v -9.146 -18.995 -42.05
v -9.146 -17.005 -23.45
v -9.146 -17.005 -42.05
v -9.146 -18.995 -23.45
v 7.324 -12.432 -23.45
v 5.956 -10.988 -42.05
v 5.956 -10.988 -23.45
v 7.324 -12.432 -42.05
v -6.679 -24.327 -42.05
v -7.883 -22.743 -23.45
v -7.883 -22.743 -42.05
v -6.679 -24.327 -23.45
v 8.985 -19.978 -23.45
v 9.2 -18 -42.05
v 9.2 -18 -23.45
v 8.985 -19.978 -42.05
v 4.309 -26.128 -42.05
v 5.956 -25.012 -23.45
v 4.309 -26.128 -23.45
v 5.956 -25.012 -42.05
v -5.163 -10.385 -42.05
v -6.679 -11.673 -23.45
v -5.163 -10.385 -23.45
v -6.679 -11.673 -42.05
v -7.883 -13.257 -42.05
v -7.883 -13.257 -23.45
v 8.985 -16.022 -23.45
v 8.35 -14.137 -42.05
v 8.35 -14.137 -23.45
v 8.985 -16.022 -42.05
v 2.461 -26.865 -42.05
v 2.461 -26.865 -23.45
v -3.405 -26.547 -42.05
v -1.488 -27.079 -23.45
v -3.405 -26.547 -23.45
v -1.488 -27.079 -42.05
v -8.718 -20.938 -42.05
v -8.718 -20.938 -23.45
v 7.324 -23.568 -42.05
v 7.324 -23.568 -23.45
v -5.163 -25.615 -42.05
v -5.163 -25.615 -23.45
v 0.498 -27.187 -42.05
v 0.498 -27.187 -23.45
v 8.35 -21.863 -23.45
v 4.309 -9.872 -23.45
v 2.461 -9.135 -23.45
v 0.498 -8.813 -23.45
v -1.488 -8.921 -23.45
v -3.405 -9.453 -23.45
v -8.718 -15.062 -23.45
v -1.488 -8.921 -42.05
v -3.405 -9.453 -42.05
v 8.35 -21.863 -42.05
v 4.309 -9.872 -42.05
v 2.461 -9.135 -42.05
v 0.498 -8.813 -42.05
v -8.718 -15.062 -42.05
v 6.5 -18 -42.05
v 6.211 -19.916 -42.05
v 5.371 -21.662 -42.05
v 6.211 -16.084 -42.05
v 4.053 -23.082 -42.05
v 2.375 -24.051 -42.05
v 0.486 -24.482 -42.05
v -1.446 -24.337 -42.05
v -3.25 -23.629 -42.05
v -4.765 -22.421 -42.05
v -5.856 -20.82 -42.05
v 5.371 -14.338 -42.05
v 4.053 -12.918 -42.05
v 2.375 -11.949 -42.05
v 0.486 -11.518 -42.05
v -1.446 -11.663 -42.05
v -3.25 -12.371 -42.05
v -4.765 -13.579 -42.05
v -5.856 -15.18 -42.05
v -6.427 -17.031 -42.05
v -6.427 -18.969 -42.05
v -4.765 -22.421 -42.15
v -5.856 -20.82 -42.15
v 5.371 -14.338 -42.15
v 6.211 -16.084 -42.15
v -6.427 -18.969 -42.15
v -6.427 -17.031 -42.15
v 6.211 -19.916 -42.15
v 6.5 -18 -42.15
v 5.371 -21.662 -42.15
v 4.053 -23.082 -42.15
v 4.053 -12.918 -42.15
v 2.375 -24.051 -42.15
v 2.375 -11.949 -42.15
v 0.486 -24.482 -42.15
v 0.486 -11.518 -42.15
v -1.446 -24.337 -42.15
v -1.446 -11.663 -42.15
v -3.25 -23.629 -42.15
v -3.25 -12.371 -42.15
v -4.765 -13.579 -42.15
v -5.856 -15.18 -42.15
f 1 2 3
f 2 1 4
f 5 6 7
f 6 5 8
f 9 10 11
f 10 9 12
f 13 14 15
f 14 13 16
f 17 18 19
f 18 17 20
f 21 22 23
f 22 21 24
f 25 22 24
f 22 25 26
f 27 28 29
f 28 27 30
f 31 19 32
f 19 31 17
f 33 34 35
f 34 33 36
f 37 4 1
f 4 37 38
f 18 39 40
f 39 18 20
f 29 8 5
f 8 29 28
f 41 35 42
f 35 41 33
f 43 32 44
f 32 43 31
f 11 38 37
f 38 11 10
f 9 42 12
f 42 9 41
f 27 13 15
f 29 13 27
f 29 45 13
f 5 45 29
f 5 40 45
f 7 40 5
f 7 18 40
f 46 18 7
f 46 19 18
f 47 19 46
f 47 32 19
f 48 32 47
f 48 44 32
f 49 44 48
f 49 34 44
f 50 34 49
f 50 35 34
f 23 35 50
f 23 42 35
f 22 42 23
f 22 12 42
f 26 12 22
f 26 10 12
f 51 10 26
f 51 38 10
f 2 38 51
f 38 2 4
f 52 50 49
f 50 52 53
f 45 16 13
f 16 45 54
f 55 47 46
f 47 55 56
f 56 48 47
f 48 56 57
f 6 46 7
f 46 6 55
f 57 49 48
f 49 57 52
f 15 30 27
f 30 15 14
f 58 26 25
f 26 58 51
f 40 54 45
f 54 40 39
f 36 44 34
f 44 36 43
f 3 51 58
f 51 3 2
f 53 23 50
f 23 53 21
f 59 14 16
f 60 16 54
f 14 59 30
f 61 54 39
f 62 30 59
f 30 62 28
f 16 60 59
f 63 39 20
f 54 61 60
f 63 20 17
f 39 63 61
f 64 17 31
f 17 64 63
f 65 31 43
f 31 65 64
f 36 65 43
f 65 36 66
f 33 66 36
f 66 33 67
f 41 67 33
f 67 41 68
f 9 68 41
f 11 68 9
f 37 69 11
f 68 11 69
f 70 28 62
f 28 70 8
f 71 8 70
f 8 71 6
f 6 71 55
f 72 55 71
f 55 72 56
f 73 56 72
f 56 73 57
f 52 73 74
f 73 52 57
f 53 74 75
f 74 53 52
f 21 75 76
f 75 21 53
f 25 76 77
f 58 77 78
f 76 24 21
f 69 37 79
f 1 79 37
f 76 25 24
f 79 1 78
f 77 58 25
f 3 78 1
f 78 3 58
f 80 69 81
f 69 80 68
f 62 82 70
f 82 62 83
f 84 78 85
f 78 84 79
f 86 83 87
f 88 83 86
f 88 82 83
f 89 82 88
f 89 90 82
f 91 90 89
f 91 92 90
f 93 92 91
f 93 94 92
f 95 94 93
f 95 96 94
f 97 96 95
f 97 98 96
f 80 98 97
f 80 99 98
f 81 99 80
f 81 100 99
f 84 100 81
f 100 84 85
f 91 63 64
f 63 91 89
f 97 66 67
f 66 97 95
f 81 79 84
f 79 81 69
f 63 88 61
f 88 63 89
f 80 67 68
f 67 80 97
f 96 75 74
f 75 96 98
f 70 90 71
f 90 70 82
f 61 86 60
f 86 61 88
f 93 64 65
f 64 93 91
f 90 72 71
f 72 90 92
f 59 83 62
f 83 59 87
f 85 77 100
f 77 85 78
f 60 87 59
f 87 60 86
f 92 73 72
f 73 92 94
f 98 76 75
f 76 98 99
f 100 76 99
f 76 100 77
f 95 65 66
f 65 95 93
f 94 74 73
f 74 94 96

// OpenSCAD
// file: common.scad
module basicShape(height)
translate ([0, 0, ground]) union(){
    difference(){
	   	union(){
	        intersection(){
	            rotate ([0, 0, 30]) 
                    cylinder_outer(height, (outerDiameter*0.5+minWallThickness), 6);
	            translate ([0,0,(height/2)]) 
                    cube ([outerDiameter*2, (sqrt(3)*(outerDiameter*0.5+minWallThickness)), height], center = true);
	 	    };
	        cylinder(height, d=(outerDiameter + 2* minWallThickness)); 
	   	};
        union(){
        	translate ([0, 0, floorThickness]) 
                cylinder(height, d=innerDiameter, center=false);
        	translate ([0, 0, (height - pipeInsert)]) 
                cylinder(height, d=outerDiameter, center=false);
        };
    };
};


module cylinder_outer(height,radius,fn){  	//from https://en.wikibooks.org/wiki/OpenSCAD_User_Manual/undersized_circular_objects
   fudge = 1/cos(180/fn);
   cylinder(h=height,r=radius*fudge,$fn=fn);
}
   
module curvedFlueLoft(upperDiameter, lowerDiameter, loftCeiling, loftFloor){
    union(){
        hull(){
        	translate([0, airSupplyY, loftFloor]) cylinder(h=0.1, d=lowerDiameter, center=true);
        	translate([0, airSupplyY, (ground + tubeInsert)])cylinder(h=0.1, d=lowerDiameter, center=true);
        }
       	for (a = [(angle*-0.5) : (angle/flueSteps) : (angle*0.5)])
            hull(){
            rotate ([0, 0, a]) translate ([0, (outerDiameter*-0.5), loftCeiling]) cube ([flueStepWidth, upperDiameter, 0.1], center=true);
            translate ([0, airSupplyY, (loftFloor + tubeInsert)]) cylinder (0.1, d=lowerDiameter);
        };
    };
}

module outerCurvedLoft(){
    curvedFlueLoft(    
        upperDiameter = (flueWidth + minWallThickness), 
        lowerDiameter = (outerTube + 2 * minWallThickness),
        loftCeiling = 0,
        loftFloor = ground
    );
}

module innerCurvedLoft(){
    curvedFlueLoft(
        upperDiameter = flueWidth, 
        lowerDiameter = innerTube, 
        loftCeiling = 0.1, 
        loftFloor = (ground-0.1)
    ); 
}
    
module outerCurvedLoft2(){
    curvedFlueLoft2(    
        upperDiameter = (flueWidth + minWallThickness), 
        lowerDiameter = (outerTube + 2 * minWallThickness),
        loftCeiling = 0,
        loftFloor = ground
    );
}

module innerCurvedLoft2(){
    curvedFlueLoft2(
        upperDiameter = flueWidth, 
        lowerDiameter = innerTube, 
        loftCeiling = 0.1, 
        loftFloor = (ground-0.1)
    ); 
}

module airSupplySpacer(){
    translate ([0, airSupplyY, (ground-0.1)]) 
    cylinder (tubeInsert, d=outerTube, center=false);
}
// main file
// flue pippe. work in progress.

include <common.scad>

// variables
outerDiameter = 40;
innerDiameter = 36;
labiumWidth = 35;
outCut = 10;
lengthFlue = 40; // coordinate this with the frequency
outerTube = 16;
innerTube = 13;
minWallThickness = 1.2;
floorThickness = 2;
flueWidth = 0.8;
flueSteps = 11;  // flue seems to behave weird for some values

// proportions, are most likely good like that
tubeInsert = outerTube + 2.5;       // length
pipeInsert = innerDiameter * 0.1 + 5; // length
airSupplyY = outerDiameter*-0.45;    // y position of air supply
height = 85; // die 85 ist testweise, muss die Höhe noch entscheiden

// calculations, don't touch in production use
labiumX = sin(labiumWidth * 180 / outerDiameter / PI) * outerDiameter; 
angle = labiumWidth * 360 / outerDiameter / PI;
ground = (lengthFlue + floorThickness)*-1;
flueStepWidth = labiumWidth * 180 / (outerDiameter+flueWidth) / PI / flueSteps;
soundingLength = height - pipeInsert - floorThickness;

// announcing sounding length
echo(str("the sounding length inside the model in mm: ", soundingLength));

// flueLength warning
if (lengthFlue < outerTube * 2)
    echo("lengthFlue is too short");

module curvedFlueLoft2(upperDiameter, lowerDiameter, loftCeiling, loftFloor){
    union(){
        hull(){
        	translate([0, airSupplyY, loftFloor]) 
                cylinder(h=0.1, d=lowerDiameter, center=true);
        	translate([0, airSupplyY, (ground + tubeInsert)])
                cylinder(h=0.1, d=lowerDiameter, center=true);
        };
    //    fluePolyhedron();
                  // zusammen gestecktes fluePolyhedron
        polyhedron( 
            points = [
            for (i=[0 : (4*flueSteps-1)]) 
                if (i%2 == 0)
                    [
for (i =[(270+angle*0.5) : (angle/flueSteps*-1) : (270-angle*0.5)]) 
    concat(xUpperInnerFlue(i,upperDiameter), yUpperInnerFlue(i,upperDiameter), loftCeiling),
for (i =[(270-angle*0.5) : (angle/flueSteps) : (270+angle*0.5)]) 
    concat(xUpperOuterFlue(i,upperDiameter), yUpperOuterFlue(i,upperDiameter), loftCeiling)
                    ][i/2]
                else
                    [
for (i =[1 : (2*flueSteps)]) 
    concat(xLowerFlue(i,lowerDiameter), yLowerFlue(i,lowerDiameter), ground+tubeInsert) 
                    ][(i-1)/2]                 // ground+tubeInsert-0.1 für anti-koplanar?
            ],
            faces = [
                [for (i= [1 : 2 : 4*flueSteps]) i],
                [for (i= [4*flueSteps : -2 : 1]) i],
                for (i= [1: 2 : (flueSteps*4)]) 
                    concat(i % (flueSteps*4), (i+1) % (flueSteps*4), (i+2) % (flueSteps*4)),
                for (i= [0: 2 : (flueSteps*4)-1]) 
                    concat((i+2) % (flueSteps*4), (i+1) % (flueSteps*4), i % (flueSteps*4))
            ]
        );
    };
};

// functions for the flue polyhedron
function alpha(c) = (360 * (0.5*c-0.25) / flueSteps); //starts with 1 on unit circle
function xLowerFlue(i,lowerDiameter) = cos(alpha(i))*lowerDiameter/2;
function yLowerFlue(i,lowerDiameter) = sin(alpha(i))*lowerDiameter/2 + airSupplyY;
    
function xUpperInnerFlue(i,upperDiameter) = cos(i)*(outerDiameter-upperDiameter)/2;
function yUpperInnerFlue(i,upperDiameter) = sin(i)*(outerDiameter-upperDiameter)/2;
function xUpperOuterFlue(i,upperDiameter) = cos(i)*(outerDiameter+upperDiameter)/2;
function yUpperOuterFlue(i,upperDiameter) = sin(i)*(outerDiameter+upperDiameter)/2;

upperPoints=[
    for (i =[(270+angle*0.5) : (angle/flueSteps*-1) : (270-angle*0.5)]) 
        concat(xUpperInnerFlue(i), yUpperInnerFlue(i), 0),
    for (i =[(270-angle*0.5) : (angle/flueSteps) : (270+angle*0.5)]) 
        concat(xUpperOuterFlue(i), yUpperOuterFlue(i), 0)
];

lowerPoints=[
    for (i =[1 : (2*flueSteps)]) 
        concat(xLowerFlue(i), yLowerFlue(i), ground+tubeInsert)
];

fluePolyhedronPoints=[
    for (i=[0 : (4*flueSteps-1)]) 
        if (i%2 == 0)
            upperPoints[i/2]
        else
            lowerPoints[(i-1)/2]
];
        
fluePolyhedronFaces = [
    [for (i= [1 : 2 : 4*flueSteps]) i],
    [for (i= [4*flueSteps : -2 : 1]) i],
    for (i= [1: 2 : (flueSteps*4)]) 
        concat(i % (flueSteps*4), (i+1) % (flueSteps*4), (i+2) % (flueSteps*4)),
    for (i= [0: 2 : (flueSteps*4)-1]) 
        concat((i+2) % (flueSteps*4), (i+1) % (flueSteps*4), i % (flueSteps*4))
];

module fluePolyhedron(upperDiameter, lowerDiameter, loftCeiling) {polyhedron( 
    points = fluePolyhedronPoints,
    faces = fluePolyhedronFaces);
};


// logic
%difference(){
    union(){
        basicShape(height); 
        outerCurvedLoft2();
    };
    union(){
        innerCurvedLoft2(); 
        airSupplySpacer();
    };
};

// test

color("red")outerCurvedLoft2();
color("blue")innerCurvedLoft2();



/* todo:
polyhedron troubleshooting
Labiumcut
assembly
height
*/

echo(version=version());
